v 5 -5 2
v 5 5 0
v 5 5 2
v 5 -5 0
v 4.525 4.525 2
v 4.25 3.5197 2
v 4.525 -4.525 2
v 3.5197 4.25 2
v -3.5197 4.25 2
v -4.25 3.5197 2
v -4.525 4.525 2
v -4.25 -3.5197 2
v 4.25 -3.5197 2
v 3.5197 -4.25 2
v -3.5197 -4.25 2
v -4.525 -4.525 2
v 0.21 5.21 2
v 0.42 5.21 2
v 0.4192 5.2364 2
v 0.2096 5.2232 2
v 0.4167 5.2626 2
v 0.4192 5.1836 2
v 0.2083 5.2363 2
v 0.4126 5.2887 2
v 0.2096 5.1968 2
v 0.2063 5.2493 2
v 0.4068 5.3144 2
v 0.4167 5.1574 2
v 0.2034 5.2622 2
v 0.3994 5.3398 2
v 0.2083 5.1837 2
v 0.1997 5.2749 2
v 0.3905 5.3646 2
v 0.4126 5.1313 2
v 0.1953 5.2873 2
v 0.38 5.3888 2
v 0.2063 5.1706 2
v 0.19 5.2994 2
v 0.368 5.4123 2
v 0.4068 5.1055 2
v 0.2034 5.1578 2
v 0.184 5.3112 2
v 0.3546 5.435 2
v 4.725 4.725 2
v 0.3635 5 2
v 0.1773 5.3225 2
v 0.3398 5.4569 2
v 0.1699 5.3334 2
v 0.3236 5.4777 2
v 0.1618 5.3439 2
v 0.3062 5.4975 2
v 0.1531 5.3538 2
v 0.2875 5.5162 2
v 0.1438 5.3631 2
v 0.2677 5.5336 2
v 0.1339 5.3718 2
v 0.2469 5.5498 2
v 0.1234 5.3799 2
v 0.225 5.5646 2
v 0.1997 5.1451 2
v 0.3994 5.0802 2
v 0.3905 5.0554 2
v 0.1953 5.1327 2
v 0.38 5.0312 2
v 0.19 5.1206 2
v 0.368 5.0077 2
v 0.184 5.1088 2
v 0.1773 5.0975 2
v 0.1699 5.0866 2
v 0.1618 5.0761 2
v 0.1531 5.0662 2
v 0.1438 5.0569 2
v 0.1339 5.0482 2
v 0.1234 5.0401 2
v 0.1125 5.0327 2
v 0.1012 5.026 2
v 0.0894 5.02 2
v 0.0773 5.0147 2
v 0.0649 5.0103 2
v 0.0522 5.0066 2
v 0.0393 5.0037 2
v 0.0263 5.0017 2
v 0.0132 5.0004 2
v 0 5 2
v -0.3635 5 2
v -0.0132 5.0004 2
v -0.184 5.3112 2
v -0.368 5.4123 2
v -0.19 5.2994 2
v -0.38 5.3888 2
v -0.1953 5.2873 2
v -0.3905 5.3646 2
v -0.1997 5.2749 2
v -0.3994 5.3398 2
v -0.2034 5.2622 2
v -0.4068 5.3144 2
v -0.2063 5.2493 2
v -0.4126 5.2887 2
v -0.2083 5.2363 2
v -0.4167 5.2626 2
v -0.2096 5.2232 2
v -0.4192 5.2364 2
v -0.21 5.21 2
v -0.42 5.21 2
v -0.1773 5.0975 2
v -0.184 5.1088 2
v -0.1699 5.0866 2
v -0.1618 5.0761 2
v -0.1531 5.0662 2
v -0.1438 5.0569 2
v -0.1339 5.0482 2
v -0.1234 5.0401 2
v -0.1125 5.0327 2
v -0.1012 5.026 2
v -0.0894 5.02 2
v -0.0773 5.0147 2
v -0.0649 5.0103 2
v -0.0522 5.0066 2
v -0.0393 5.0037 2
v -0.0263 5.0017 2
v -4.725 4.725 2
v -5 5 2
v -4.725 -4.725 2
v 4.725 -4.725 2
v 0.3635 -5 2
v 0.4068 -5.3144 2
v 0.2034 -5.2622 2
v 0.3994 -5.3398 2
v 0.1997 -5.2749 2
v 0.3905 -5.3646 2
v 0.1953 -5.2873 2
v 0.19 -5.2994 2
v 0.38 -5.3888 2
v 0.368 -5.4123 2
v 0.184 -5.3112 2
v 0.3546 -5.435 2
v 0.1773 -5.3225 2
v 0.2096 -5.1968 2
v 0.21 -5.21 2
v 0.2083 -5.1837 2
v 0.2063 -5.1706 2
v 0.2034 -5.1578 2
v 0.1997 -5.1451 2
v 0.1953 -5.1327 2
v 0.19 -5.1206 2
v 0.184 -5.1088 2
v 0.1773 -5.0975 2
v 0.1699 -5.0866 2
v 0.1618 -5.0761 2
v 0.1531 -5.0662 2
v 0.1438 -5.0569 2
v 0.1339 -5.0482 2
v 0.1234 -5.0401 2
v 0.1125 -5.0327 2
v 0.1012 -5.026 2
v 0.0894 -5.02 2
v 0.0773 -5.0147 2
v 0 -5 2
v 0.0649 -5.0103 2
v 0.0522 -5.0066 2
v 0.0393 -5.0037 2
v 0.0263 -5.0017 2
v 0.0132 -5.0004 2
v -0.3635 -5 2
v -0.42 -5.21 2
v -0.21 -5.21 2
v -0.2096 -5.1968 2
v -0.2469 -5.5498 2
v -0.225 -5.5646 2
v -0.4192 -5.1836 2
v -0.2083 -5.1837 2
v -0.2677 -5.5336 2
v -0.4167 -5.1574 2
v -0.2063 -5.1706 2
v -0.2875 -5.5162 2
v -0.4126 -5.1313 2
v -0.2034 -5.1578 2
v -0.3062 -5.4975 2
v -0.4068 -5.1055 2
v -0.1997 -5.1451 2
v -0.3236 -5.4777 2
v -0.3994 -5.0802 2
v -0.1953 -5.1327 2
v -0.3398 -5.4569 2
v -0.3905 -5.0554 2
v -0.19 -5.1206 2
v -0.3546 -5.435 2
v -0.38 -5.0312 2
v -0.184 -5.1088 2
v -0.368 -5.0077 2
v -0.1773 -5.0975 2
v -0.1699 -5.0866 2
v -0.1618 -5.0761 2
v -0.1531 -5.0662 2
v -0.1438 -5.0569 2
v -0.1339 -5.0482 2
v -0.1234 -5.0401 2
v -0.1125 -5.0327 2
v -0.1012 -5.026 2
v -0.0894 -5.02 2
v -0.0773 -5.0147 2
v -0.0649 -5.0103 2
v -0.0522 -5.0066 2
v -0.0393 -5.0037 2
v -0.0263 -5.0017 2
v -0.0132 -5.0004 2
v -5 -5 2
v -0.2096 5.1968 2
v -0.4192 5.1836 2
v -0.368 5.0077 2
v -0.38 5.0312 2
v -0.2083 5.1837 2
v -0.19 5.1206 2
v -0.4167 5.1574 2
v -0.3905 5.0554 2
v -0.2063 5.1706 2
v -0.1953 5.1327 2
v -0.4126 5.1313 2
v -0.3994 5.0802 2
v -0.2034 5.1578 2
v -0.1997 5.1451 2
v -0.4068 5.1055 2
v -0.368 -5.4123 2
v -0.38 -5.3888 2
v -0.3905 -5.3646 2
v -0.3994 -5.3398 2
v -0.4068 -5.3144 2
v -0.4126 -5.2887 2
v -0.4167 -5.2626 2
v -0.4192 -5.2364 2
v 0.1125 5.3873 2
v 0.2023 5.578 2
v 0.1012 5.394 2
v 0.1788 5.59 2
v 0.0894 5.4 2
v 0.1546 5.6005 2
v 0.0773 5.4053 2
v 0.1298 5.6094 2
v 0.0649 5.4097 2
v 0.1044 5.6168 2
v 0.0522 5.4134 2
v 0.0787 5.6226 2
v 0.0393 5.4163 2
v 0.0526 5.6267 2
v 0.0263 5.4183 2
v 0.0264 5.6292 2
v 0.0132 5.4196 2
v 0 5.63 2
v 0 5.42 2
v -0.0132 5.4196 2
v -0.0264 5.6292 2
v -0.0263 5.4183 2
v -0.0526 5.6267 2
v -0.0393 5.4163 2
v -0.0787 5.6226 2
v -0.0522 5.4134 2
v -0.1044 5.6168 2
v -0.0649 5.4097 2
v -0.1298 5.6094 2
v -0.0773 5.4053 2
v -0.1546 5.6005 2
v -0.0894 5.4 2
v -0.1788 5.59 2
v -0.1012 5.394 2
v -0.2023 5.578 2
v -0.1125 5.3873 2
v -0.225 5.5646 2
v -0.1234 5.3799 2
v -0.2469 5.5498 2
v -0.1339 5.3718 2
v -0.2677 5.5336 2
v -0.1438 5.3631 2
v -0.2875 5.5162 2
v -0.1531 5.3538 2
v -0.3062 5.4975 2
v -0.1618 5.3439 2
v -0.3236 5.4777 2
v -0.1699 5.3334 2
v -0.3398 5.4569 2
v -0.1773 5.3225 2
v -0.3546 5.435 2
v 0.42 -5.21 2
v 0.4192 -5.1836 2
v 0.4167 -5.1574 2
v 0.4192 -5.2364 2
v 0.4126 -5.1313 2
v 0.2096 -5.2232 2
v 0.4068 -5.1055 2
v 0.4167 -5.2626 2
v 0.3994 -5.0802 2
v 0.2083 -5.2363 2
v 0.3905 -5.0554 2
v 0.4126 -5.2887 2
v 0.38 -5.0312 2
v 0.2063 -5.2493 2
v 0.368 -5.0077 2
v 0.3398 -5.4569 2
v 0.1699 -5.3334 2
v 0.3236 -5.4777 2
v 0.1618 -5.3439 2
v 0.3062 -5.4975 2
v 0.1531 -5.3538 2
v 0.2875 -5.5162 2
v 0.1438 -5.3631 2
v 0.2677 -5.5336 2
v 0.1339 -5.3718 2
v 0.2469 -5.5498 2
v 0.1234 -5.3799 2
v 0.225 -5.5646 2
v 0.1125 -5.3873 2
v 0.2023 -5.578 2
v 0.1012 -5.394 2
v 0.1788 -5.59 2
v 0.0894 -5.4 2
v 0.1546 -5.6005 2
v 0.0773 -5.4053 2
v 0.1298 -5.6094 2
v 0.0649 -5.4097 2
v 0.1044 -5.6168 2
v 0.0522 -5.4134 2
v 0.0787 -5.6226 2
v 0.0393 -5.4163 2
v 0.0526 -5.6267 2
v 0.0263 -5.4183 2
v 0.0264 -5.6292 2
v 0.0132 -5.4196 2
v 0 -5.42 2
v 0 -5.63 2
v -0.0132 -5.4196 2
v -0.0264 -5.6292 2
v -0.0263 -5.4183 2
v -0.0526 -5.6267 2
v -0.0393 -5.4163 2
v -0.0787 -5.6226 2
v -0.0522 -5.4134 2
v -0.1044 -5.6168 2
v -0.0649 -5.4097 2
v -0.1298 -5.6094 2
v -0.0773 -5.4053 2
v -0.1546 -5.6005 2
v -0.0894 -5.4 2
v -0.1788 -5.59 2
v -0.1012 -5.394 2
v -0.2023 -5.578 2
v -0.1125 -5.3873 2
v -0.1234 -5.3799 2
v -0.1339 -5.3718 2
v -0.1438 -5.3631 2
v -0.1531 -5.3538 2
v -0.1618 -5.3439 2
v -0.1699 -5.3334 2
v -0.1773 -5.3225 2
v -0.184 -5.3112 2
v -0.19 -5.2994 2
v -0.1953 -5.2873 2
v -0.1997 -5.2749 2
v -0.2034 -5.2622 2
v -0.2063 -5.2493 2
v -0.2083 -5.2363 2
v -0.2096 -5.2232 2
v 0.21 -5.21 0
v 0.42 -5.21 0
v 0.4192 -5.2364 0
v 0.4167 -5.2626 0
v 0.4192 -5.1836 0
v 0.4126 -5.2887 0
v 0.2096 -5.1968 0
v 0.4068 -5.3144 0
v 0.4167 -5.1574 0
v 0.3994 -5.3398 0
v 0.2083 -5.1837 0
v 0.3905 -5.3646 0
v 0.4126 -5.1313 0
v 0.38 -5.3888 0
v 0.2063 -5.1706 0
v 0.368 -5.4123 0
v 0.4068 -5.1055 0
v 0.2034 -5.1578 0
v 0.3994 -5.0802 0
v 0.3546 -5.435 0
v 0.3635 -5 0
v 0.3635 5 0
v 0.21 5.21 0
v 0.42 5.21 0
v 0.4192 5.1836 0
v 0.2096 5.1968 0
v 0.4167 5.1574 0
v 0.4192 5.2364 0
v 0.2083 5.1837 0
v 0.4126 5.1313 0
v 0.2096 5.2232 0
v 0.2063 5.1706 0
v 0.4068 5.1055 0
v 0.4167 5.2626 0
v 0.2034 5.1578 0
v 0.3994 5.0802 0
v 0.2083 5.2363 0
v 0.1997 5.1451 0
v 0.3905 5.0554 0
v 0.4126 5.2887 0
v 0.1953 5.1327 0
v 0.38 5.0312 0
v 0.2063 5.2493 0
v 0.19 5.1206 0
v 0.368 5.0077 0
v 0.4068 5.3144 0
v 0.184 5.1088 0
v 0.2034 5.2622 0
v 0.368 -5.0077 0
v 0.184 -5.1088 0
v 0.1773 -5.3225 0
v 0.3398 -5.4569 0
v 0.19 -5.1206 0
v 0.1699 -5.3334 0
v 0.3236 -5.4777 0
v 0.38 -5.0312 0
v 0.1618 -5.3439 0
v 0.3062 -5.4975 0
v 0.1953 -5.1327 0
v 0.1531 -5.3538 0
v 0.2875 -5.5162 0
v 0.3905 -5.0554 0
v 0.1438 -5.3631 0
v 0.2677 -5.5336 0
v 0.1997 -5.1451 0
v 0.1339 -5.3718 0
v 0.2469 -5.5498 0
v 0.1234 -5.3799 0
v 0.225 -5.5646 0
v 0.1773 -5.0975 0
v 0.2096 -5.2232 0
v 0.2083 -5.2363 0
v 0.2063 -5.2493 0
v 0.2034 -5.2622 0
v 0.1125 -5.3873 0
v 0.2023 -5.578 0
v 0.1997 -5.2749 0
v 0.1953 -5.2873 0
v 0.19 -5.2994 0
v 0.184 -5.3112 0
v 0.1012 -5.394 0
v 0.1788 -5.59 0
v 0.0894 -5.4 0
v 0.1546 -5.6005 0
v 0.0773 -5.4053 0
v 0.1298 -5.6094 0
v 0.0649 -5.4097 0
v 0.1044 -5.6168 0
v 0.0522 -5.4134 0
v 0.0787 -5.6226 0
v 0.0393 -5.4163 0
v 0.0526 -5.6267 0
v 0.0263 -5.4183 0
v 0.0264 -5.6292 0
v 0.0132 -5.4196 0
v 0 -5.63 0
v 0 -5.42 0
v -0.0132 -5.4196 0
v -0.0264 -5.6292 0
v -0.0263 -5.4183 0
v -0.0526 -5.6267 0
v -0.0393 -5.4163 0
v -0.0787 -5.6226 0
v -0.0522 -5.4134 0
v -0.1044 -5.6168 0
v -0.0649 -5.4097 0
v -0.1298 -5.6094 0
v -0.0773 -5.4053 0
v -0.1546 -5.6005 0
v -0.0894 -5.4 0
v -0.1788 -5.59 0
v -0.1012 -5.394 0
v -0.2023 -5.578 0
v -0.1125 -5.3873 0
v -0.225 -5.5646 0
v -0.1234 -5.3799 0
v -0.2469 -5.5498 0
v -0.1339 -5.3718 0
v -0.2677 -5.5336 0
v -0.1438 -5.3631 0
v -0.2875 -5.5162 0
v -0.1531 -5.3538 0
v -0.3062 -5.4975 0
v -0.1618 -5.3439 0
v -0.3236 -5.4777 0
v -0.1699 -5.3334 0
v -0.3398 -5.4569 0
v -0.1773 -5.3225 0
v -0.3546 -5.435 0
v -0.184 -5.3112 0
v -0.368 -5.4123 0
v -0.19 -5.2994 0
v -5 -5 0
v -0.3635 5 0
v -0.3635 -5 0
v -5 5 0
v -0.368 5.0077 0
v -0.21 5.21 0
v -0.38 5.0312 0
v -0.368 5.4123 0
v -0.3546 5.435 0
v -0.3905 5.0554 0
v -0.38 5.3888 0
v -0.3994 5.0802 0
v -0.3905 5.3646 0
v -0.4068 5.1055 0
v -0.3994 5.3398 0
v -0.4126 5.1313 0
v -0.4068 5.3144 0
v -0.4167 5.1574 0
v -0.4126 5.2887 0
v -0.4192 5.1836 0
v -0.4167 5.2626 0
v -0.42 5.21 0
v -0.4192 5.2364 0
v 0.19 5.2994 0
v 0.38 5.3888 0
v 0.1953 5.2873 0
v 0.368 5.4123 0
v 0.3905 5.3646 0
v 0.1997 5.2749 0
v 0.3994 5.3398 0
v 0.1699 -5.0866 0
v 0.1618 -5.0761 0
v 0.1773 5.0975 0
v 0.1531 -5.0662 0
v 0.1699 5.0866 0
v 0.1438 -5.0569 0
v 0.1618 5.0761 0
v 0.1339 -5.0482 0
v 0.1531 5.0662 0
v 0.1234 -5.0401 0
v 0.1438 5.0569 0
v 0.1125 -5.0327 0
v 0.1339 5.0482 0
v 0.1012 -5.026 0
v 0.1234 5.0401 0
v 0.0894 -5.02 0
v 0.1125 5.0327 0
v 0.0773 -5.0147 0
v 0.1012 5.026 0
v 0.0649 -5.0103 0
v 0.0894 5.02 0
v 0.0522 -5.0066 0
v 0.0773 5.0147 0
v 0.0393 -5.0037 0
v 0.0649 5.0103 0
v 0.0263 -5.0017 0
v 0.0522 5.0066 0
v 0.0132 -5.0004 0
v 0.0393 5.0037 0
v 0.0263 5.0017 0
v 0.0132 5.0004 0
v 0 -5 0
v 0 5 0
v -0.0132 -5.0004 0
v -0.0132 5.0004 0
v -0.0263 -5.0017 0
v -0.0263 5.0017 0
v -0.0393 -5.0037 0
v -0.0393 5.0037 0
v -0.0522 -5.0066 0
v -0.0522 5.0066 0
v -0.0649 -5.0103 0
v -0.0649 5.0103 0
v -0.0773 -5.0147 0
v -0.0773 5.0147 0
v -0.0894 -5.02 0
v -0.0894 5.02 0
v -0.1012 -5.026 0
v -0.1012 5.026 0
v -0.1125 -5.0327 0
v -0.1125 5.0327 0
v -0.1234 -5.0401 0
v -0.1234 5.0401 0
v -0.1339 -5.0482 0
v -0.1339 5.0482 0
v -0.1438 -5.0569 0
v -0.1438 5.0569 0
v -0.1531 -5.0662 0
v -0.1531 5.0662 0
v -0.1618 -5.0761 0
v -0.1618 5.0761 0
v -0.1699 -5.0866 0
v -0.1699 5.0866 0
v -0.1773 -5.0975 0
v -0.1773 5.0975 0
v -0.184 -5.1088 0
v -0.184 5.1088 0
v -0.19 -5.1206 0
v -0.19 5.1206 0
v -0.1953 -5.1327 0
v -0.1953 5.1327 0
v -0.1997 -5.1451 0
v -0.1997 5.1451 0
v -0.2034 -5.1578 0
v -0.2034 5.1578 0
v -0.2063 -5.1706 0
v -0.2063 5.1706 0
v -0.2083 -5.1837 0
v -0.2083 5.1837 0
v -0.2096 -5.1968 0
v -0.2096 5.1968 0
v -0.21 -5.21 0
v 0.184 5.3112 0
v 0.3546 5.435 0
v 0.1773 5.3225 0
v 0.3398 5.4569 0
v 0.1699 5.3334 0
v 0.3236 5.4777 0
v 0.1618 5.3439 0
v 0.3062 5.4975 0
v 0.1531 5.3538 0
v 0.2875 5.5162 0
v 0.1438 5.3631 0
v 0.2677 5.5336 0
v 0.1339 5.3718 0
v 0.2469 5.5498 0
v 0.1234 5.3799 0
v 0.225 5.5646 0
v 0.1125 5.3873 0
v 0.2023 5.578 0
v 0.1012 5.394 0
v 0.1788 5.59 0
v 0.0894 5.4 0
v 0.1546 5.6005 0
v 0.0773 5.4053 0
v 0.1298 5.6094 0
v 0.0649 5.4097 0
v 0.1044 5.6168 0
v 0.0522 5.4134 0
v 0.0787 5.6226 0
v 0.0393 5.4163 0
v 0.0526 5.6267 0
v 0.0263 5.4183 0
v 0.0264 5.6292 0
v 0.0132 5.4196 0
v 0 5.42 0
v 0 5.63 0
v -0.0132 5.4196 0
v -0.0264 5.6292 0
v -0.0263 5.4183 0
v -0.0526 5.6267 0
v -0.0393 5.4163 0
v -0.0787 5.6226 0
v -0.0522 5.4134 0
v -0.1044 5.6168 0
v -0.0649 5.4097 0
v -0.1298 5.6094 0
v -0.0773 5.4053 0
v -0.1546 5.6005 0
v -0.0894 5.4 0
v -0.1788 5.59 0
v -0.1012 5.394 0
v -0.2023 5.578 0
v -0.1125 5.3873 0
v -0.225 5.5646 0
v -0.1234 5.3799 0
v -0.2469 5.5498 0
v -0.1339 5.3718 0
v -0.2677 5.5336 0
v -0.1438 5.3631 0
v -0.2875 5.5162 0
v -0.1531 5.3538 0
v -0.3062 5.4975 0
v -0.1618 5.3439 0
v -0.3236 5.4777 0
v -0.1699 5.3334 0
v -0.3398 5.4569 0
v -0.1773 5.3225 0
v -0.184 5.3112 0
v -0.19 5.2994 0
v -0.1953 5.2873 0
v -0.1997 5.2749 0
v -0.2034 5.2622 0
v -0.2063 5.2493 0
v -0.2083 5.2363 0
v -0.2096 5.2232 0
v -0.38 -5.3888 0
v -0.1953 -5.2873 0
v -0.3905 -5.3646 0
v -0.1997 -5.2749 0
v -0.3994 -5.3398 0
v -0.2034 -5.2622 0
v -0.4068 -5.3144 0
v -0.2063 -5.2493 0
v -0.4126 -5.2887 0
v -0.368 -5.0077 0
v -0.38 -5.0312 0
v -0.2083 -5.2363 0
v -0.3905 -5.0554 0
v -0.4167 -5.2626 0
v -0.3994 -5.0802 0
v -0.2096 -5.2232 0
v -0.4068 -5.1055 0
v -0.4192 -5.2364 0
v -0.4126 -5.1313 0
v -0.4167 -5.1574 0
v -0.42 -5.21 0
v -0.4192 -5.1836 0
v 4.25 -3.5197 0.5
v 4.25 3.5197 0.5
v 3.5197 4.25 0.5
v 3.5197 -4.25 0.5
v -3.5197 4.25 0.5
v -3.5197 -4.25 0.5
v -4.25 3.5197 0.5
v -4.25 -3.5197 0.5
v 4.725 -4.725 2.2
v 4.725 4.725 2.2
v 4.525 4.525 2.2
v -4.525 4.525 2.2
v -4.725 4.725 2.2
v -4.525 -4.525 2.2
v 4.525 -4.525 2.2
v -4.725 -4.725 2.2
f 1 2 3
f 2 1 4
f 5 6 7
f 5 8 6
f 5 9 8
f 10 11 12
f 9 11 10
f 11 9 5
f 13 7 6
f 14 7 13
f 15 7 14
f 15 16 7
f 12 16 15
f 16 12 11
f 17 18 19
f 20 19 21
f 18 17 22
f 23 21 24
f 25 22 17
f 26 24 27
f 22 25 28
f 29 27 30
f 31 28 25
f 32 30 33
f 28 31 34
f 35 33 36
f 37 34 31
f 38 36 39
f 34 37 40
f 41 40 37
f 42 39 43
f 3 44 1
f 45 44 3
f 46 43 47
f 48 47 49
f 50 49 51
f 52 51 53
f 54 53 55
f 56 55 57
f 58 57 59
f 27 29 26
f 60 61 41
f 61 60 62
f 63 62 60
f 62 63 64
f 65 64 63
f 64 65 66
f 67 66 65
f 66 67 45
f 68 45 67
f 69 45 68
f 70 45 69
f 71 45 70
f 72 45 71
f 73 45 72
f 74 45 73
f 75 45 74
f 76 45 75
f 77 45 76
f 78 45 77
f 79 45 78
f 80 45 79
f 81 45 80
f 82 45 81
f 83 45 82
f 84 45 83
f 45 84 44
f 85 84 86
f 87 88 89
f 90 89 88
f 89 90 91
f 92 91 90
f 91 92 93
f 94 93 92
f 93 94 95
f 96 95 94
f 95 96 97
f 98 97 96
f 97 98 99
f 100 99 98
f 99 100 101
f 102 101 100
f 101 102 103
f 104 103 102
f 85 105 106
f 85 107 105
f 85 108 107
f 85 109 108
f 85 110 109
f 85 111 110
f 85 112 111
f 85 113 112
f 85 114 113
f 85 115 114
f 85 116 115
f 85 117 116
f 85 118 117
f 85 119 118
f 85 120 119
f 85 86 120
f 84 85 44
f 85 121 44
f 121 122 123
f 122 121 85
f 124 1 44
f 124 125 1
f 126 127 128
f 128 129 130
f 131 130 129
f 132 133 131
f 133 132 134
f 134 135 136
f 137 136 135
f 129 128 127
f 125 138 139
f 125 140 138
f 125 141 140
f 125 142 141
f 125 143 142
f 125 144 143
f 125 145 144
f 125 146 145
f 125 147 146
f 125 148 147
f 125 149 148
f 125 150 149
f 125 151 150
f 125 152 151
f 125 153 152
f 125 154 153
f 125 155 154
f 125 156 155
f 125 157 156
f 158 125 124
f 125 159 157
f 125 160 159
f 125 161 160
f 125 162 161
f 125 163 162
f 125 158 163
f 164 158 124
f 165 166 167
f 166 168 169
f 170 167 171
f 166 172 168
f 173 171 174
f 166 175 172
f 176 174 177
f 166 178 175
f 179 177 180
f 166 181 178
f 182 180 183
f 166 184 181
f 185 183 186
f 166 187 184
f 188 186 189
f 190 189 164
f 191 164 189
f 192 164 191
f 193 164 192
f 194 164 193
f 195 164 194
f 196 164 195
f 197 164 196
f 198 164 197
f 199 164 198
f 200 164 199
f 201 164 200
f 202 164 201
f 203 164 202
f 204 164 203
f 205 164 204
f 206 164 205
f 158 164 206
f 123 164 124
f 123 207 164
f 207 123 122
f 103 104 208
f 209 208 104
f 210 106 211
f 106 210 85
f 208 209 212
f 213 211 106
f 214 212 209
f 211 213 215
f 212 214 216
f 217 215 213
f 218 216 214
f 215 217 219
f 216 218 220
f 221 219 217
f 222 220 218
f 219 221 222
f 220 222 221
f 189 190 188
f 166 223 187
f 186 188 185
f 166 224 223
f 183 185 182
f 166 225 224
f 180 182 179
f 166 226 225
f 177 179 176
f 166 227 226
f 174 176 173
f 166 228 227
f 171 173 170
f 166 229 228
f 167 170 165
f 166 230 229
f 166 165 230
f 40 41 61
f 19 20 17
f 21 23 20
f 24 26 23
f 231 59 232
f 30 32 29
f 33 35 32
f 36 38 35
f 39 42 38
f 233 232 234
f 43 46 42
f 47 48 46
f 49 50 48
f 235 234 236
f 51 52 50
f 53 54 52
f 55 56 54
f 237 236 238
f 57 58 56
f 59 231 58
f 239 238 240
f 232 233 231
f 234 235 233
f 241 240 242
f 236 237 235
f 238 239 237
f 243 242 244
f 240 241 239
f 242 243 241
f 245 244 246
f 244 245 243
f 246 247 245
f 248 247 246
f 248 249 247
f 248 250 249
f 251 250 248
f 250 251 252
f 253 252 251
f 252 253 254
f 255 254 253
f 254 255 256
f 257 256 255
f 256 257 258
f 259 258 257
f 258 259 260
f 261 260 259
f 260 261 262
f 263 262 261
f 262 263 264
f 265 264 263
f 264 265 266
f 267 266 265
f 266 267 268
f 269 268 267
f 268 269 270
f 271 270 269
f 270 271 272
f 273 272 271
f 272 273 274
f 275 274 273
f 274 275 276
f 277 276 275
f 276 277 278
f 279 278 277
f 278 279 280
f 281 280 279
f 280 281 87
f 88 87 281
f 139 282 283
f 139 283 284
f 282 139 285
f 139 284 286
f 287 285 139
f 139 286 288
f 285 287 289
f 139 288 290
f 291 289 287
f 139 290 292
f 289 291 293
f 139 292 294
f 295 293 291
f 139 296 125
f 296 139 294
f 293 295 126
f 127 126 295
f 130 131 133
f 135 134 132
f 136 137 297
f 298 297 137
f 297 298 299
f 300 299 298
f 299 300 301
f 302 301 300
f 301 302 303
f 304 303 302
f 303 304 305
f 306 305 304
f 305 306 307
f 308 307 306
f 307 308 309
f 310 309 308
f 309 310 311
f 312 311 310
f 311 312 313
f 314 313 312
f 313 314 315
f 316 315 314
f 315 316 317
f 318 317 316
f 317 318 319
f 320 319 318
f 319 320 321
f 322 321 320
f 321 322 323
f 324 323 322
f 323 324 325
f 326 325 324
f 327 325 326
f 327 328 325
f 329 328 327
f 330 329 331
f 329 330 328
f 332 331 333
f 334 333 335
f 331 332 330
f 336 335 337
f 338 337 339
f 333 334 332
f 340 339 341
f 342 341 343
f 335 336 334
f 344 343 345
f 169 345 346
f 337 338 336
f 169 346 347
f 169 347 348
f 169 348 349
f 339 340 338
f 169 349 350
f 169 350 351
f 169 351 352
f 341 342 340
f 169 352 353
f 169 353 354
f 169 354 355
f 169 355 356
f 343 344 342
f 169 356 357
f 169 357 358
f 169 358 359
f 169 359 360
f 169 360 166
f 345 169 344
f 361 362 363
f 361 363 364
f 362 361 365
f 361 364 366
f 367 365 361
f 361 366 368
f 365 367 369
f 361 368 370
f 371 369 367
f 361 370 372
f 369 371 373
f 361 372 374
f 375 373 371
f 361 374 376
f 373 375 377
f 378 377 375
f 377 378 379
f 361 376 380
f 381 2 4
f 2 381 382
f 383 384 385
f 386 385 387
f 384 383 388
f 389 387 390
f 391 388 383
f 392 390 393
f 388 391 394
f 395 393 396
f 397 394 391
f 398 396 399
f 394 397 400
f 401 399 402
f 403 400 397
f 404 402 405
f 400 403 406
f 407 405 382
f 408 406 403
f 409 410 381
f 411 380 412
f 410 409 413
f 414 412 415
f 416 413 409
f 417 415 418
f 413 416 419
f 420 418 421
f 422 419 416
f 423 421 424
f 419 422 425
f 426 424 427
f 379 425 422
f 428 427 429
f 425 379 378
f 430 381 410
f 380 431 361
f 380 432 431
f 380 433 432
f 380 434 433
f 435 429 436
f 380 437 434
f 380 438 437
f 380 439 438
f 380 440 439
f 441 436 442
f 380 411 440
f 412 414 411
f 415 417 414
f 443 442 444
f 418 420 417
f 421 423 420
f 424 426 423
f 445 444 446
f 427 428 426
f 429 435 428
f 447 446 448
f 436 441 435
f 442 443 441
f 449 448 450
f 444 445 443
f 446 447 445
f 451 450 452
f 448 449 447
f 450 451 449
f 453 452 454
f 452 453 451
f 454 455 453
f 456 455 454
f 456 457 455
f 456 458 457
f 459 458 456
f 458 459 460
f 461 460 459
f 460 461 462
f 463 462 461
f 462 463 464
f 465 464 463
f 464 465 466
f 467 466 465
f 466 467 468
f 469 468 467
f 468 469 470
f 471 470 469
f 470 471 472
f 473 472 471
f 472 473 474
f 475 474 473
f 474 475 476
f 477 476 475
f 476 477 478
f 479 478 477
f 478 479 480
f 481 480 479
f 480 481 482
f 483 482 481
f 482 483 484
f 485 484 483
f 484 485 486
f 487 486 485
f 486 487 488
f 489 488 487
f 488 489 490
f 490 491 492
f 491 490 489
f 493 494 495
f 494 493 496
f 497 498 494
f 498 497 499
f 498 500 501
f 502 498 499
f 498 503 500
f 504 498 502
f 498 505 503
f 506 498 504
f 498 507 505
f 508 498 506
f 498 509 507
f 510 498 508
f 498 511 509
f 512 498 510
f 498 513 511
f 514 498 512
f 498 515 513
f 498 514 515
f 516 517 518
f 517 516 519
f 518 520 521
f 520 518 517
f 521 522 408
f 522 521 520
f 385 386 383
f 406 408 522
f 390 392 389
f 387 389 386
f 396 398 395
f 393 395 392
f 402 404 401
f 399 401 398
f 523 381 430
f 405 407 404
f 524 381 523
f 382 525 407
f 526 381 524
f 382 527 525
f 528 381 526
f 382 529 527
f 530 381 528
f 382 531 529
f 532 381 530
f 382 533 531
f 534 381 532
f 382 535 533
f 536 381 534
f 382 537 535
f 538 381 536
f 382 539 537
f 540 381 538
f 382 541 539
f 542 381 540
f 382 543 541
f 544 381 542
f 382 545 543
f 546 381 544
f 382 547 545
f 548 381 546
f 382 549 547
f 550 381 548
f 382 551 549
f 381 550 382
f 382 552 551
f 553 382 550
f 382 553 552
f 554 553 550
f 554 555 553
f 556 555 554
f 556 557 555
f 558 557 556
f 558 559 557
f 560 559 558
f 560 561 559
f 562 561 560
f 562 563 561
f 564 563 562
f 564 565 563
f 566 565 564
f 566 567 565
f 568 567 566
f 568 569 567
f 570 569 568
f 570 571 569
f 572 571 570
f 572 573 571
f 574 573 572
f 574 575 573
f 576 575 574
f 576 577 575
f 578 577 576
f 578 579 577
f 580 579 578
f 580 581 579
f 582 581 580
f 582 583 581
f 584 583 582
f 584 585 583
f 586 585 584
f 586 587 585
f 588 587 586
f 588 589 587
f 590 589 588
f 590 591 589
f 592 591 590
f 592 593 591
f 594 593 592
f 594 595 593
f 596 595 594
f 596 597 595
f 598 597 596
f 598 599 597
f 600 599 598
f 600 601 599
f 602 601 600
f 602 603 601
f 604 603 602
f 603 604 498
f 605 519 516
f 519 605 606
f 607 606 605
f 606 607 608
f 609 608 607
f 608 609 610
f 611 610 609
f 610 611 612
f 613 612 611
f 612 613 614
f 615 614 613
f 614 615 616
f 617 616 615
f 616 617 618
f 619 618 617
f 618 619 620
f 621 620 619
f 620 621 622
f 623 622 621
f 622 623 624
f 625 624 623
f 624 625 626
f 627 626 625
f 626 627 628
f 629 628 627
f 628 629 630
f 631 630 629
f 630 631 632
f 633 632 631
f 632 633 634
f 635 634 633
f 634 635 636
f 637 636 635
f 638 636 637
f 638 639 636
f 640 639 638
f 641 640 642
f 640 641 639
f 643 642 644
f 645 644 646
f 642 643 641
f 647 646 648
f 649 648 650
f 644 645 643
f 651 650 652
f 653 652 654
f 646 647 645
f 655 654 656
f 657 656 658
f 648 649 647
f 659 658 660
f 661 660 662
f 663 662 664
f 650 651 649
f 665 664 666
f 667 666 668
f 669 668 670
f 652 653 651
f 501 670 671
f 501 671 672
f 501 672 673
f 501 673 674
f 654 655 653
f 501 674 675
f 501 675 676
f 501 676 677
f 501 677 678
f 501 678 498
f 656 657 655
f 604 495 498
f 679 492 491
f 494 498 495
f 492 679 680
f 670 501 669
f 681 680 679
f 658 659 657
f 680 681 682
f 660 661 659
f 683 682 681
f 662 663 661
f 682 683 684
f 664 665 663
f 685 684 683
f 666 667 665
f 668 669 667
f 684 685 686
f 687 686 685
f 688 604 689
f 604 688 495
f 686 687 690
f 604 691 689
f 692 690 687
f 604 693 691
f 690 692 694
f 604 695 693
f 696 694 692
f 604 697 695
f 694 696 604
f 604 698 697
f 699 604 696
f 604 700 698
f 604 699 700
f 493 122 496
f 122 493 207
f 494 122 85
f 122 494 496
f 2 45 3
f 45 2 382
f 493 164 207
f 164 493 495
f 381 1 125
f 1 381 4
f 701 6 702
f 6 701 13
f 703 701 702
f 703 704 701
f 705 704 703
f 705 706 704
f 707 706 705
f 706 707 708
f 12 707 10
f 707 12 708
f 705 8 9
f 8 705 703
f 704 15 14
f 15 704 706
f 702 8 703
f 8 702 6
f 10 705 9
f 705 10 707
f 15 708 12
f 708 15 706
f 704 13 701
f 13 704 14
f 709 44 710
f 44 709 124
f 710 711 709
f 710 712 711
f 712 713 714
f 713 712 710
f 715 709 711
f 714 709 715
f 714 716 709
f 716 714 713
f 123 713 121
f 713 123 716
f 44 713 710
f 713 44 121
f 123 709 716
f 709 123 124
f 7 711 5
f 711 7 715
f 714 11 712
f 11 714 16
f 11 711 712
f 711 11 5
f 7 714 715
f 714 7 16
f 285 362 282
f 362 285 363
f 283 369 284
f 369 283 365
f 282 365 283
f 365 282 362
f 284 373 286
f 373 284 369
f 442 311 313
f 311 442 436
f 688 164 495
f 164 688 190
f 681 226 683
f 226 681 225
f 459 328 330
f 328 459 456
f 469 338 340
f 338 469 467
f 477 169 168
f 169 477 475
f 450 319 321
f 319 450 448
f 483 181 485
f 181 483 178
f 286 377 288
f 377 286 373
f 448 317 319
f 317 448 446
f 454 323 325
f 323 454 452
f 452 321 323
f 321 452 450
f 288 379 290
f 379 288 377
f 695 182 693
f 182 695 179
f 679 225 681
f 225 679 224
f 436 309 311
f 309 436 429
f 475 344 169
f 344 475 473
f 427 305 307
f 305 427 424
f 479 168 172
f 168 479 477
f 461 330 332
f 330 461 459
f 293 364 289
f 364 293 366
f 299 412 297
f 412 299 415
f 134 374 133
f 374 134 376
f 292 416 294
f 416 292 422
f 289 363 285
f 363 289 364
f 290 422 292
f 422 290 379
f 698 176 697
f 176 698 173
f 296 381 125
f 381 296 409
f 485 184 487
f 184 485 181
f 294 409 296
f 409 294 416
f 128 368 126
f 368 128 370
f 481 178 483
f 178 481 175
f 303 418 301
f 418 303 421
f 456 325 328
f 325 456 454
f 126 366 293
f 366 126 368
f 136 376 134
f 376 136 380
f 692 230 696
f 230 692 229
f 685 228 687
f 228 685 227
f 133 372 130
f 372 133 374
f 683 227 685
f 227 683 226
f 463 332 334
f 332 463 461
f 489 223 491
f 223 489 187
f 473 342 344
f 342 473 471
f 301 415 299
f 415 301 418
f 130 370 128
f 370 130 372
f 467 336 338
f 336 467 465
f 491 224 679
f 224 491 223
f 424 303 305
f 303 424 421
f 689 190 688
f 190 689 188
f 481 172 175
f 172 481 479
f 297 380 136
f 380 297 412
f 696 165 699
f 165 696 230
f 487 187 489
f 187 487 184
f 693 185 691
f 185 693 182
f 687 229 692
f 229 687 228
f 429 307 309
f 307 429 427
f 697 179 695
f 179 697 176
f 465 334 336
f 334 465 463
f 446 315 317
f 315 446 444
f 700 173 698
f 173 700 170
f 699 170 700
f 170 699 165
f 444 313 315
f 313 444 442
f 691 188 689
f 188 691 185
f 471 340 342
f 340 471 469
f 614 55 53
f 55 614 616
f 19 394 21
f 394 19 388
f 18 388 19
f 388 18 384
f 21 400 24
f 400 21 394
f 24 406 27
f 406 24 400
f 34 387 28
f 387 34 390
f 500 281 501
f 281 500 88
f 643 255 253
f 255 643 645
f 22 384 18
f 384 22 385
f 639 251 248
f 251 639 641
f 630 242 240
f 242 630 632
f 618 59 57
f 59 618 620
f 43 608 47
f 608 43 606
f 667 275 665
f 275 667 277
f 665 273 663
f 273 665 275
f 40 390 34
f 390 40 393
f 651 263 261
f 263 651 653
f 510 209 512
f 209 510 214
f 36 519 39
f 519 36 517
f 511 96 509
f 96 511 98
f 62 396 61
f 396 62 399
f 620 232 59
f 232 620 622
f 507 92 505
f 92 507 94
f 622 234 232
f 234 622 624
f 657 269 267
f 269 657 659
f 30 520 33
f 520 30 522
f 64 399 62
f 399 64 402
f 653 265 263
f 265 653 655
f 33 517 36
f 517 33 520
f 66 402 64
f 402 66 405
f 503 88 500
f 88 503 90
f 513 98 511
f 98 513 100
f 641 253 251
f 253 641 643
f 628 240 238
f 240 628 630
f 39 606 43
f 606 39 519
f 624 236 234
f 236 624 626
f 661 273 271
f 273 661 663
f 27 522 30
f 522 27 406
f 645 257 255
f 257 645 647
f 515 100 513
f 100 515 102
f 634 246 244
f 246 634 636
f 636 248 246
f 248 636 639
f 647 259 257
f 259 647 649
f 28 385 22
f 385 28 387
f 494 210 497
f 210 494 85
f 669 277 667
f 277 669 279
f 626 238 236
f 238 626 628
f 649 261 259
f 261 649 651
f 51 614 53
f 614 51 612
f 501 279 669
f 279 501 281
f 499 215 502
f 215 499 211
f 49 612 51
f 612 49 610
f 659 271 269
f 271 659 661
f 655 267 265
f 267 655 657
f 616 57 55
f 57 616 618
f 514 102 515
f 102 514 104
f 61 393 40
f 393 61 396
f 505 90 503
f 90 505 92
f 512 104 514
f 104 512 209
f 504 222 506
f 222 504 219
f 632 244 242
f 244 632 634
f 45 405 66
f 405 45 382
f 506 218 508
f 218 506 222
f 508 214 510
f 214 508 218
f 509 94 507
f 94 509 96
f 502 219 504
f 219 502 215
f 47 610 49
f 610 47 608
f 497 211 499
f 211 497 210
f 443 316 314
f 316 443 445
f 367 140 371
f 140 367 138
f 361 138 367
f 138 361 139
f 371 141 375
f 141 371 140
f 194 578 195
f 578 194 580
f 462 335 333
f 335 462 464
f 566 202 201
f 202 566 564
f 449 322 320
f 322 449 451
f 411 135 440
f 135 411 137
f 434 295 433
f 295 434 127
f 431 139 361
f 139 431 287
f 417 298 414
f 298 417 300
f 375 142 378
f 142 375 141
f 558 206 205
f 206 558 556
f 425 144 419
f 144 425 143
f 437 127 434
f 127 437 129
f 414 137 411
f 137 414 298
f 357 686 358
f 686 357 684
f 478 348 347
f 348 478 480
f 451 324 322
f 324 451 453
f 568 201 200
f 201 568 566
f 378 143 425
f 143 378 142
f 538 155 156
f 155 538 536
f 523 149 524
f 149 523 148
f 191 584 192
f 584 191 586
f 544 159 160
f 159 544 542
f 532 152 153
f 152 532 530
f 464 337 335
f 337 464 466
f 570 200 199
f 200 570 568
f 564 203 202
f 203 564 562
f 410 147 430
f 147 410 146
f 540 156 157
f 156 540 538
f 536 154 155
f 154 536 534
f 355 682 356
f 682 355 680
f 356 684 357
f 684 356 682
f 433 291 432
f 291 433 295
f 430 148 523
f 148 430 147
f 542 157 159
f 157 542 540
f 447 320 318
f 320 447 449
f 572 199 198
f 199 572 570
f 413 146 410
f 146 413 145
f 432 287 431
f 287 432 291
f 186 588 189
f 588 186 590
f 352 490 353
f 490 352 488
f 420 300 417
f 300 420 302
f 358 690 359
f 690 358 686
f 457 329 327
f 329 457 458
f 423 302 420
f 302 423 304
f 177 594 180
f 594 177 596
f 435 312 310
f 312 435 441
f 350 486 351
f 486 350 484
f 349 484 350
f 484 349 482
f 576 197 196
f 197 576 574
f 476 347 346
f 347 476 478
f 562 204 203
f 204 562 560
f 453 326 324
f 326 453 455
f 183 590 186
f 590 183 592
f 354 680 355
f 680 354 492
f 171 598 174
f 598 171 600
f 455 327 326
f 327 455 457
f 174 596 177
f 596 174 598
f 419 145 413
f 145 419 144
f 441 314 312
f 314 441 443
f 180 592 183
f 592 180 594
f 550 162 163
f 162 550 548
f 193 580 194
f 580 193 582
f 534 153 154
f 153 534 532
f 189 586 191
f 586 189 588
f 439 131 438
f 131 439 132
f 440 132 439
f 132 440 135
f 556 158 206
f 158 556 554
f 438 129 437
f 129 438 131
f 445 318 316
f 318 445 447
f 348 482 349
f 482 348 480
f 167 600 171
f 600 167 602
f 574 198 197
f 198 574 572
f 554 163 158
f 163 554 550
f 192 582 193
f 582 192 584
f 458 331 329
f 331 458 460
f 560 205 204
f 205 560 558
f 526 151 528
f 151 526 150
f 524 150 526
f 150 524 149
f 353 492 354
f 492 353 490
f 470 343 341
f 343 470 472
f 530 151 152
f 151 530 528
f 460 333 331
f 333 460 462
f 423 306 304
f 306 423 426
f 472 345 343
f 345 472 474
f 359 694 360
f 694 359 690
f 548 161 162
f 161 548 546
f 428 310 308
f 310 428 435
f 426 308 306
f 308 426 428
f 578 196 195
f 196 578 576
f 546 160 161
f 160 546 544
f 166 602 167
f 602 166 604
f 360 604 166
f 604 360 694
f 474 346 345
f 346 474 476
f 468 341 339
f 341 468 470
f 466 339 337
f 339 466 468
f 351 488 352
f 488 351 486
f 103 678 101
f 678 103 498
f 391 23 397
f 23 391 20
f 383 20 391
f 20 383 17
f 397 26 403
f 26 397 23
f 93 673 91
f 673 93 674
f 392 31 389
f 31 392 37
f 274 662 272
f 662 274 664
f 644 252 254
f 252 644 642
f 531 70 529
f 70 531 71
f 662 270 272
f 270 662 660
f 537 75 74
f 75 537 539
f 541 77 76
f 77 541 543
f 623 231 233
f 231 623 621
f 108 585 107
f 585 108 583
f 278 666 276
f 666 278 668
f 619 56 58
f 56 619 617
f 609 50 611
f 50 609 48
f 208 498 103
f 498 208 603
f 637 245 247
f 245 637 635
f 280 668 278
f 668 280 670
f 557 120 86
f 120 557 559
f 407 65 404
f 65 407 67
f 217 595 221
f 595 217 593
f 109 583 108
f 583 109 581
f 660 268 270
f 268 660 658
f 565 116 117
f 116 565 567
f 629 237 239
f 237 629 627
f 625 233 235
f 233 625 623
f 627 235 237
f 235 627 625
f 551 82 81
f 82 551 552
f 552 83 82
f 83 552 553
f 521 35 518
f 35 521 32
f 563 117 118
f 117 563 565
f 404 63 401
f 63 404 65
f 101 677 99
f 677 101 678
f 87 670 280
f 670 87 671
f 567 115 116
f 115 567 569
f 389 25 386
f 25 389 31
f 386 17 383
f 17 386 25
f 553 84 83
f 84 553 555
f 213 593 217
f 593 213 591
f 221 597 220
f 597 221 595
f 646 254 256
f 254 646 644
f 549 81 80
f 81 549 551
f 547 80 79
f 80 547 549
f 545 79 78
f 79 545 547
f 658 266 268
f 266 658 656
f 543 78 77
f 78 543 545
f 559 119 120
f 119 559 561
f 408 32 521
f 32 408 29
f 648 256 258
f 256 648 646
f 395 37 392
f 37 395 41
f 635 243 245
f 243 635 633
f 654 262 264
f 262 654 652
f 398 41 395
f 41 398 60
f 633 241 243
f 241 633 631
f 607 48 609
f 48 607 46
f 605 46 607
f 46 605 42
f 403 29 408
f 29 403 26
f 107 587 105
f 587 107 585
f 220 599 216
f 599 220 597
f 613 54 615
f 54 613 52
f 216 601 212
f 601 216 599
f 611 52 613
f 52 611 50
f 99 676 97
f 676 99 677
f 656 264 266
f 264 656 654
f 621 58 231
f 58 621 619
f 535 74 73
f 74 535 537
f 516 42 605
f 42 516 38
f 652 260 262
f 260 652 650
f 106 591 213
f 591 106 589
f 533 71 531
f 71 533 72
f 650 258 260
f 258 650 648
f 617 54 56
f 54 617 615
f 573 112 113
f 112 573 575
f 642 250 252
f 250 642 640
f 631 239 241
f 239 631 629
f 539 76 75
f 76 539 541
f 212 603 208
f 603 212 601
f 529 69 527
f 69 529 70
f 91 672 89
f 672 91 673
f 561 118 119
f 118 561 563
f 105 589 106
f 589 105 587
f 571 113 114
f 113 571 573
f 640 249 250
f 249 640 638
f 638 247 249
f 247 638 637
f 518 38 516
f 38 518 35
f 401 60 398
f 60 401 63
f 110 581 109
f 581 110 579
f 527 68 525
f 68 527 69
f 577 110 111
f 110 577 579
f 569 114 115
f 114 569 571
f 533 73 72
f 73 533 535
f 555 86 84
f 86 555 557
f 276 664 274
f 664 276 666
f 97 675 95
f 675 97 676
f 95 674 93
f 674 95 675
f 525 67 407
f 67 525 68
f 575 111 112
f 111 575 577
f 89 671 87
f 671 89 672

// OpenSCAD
// file: modules.scad
include <params.scad>;

module base_quadrant(edge_length, wall_thickness, height, shift)
{      
    difference()
    {
        translate([-edge_length/2,-edge_length/2,0])cube([edge_length,edge_length,height]);
        translate([-inner_length/2,-inner_length/2,shift])cube([inner_length,inner_length,height]);
    };  
    fill_corners(edge_length,wall_thickness,height);
}


module tongue(tongue_width, tongue_height, edge_length, wall_thickness)
{
    tongue_outer_width = edge_length - wall_thickness + tongue_width;
    tongue_inner_width = tongue_outer_width - tongue_width*2;
  
    difference()
    {
        translate([-tongue_outer_width/2,-tongue_outer_width/2, height])cube([tongue_outer_width,tongue_outer_width,tongue_height]);
        translate([-tongue_inner_width/2,-tongue_inner_width/2,height])cube([tongue_inner_width,tongue_inner_width,tongue_height]);

    };  
    
    
}


module groove(tongue_width, tongue_height, edge_length, wall_thickness) 
{
    tongue_outer_width = edge_length - wall_thickness + tongue_width;
    tongue_inner_width = tongue_outer_width - tongue_width*2;
    difference()
    {
        translate([-tongue_outer_width/2,-tongue_outer_width/2, 0])cube([tongue_outer_width,tongue_outer_width,tongue_height+0.1]);
        translate([-tongue_inner_width/2,-tongue_inner_width/2, 0])cube([tongue_inner_width,tongue_inner_width,tongue_height+0.1]);

    };
    
}

module intermodule_screw(edge_length,height,screw_radius)
{
    for (a=[-1,1])
            translate([0,a*(edge_length+2*screw_radius)/2, 0])cylinder(height,screw_radius*2,screw_radius*2);

    
}
module intermodule_screw_hole(edge_length,height,screw_radius)
{
    for (a=[-1,1])
            translate([0,a*(edge_length+2*screw_radius)/2, 0])cylinder(height, screw_radius, screw_radius);
}

module intermodule_nut_hole(edge_length,height,screw_radius,nut_width, nut_height, fn)
{
    for (a=[-1,1])
            translate([0,a*(edge_length+2*screw_radius)/2, 0])cylinder(nut_height, nut_width, nut_width, $fn=fn);
}




module module_screw(edge_length, height, screw_radius, head_width)
{

    for (a = [[-1,-1], [1,1], [1,-1], [-1,1]])
    {
        x = a[0]*(edge_length+head_width)/2;
        y = a[1]*(edge_length+head_width)/2;
        translate([x,y, 0])cylinder(height,head_width*1.5,head_width*1.5);
    }    
}

module module_screw_hole(edge_length, height, screw_radius, head_height, head_width, offset, fn)
{

    for (a = [[-1,-1], [1,1], [1,-1], [-1,1]])
    {
        x = a[0]*(edge_length+head_width)/2;
        y = a[1]*(edge_length+head_width)/2;

        translate([x,y, 0])cylinder(height, screw_radius, screw_radius);
        translate([x,y, offset])cylinder(head_height, head_width, head_width, $fn=fn);
        
    }    
}

module fill_corners(edge_length,wall_thickness,height)
{
    ar = edge_length/2-wall_thickness-0.1;
    for (rot=[45,135,225,315])
        rotate([0,0,rot])translate([sqrt(ar*ar + ar*ar),0,height/2])cube([wall_thickness,2*wall_thickness,height],center=true);
    
}
// file: params.scad
$fn = 100;

edge_length = 10;
height = 1;
wall_thickness = 0.75;

tongue_width = 0.2;
tongue_height = 0.2;

screw_radius = 0.21; //M4
head_width = 0.405;
head_height = 0.7;
nut_width = 0.4;
nut_height = 0.5;

bottom_screw_distance = 5;


inner_length = edge_length-2*wall_thickness;

tongue_outer_width = edge_length - wall_thickness + tongue_width;
tongue_inner_width = tongue_outer_width - tongue_width*2;
// main file
include <params.scad>;
include <modules.scad>;
height = 2;

difference()
{
    union(){
        base_quadrant(edge_length, wall_thickness, height, 0.5);
        tongue(tongue_width, tongue_height, edge_length, wall_thickness);
        intermodule_screw(edge_length,height,screw_radius);
    }
    intermodule_screw_hole(edge_length,height,screw_radius);
    
}
